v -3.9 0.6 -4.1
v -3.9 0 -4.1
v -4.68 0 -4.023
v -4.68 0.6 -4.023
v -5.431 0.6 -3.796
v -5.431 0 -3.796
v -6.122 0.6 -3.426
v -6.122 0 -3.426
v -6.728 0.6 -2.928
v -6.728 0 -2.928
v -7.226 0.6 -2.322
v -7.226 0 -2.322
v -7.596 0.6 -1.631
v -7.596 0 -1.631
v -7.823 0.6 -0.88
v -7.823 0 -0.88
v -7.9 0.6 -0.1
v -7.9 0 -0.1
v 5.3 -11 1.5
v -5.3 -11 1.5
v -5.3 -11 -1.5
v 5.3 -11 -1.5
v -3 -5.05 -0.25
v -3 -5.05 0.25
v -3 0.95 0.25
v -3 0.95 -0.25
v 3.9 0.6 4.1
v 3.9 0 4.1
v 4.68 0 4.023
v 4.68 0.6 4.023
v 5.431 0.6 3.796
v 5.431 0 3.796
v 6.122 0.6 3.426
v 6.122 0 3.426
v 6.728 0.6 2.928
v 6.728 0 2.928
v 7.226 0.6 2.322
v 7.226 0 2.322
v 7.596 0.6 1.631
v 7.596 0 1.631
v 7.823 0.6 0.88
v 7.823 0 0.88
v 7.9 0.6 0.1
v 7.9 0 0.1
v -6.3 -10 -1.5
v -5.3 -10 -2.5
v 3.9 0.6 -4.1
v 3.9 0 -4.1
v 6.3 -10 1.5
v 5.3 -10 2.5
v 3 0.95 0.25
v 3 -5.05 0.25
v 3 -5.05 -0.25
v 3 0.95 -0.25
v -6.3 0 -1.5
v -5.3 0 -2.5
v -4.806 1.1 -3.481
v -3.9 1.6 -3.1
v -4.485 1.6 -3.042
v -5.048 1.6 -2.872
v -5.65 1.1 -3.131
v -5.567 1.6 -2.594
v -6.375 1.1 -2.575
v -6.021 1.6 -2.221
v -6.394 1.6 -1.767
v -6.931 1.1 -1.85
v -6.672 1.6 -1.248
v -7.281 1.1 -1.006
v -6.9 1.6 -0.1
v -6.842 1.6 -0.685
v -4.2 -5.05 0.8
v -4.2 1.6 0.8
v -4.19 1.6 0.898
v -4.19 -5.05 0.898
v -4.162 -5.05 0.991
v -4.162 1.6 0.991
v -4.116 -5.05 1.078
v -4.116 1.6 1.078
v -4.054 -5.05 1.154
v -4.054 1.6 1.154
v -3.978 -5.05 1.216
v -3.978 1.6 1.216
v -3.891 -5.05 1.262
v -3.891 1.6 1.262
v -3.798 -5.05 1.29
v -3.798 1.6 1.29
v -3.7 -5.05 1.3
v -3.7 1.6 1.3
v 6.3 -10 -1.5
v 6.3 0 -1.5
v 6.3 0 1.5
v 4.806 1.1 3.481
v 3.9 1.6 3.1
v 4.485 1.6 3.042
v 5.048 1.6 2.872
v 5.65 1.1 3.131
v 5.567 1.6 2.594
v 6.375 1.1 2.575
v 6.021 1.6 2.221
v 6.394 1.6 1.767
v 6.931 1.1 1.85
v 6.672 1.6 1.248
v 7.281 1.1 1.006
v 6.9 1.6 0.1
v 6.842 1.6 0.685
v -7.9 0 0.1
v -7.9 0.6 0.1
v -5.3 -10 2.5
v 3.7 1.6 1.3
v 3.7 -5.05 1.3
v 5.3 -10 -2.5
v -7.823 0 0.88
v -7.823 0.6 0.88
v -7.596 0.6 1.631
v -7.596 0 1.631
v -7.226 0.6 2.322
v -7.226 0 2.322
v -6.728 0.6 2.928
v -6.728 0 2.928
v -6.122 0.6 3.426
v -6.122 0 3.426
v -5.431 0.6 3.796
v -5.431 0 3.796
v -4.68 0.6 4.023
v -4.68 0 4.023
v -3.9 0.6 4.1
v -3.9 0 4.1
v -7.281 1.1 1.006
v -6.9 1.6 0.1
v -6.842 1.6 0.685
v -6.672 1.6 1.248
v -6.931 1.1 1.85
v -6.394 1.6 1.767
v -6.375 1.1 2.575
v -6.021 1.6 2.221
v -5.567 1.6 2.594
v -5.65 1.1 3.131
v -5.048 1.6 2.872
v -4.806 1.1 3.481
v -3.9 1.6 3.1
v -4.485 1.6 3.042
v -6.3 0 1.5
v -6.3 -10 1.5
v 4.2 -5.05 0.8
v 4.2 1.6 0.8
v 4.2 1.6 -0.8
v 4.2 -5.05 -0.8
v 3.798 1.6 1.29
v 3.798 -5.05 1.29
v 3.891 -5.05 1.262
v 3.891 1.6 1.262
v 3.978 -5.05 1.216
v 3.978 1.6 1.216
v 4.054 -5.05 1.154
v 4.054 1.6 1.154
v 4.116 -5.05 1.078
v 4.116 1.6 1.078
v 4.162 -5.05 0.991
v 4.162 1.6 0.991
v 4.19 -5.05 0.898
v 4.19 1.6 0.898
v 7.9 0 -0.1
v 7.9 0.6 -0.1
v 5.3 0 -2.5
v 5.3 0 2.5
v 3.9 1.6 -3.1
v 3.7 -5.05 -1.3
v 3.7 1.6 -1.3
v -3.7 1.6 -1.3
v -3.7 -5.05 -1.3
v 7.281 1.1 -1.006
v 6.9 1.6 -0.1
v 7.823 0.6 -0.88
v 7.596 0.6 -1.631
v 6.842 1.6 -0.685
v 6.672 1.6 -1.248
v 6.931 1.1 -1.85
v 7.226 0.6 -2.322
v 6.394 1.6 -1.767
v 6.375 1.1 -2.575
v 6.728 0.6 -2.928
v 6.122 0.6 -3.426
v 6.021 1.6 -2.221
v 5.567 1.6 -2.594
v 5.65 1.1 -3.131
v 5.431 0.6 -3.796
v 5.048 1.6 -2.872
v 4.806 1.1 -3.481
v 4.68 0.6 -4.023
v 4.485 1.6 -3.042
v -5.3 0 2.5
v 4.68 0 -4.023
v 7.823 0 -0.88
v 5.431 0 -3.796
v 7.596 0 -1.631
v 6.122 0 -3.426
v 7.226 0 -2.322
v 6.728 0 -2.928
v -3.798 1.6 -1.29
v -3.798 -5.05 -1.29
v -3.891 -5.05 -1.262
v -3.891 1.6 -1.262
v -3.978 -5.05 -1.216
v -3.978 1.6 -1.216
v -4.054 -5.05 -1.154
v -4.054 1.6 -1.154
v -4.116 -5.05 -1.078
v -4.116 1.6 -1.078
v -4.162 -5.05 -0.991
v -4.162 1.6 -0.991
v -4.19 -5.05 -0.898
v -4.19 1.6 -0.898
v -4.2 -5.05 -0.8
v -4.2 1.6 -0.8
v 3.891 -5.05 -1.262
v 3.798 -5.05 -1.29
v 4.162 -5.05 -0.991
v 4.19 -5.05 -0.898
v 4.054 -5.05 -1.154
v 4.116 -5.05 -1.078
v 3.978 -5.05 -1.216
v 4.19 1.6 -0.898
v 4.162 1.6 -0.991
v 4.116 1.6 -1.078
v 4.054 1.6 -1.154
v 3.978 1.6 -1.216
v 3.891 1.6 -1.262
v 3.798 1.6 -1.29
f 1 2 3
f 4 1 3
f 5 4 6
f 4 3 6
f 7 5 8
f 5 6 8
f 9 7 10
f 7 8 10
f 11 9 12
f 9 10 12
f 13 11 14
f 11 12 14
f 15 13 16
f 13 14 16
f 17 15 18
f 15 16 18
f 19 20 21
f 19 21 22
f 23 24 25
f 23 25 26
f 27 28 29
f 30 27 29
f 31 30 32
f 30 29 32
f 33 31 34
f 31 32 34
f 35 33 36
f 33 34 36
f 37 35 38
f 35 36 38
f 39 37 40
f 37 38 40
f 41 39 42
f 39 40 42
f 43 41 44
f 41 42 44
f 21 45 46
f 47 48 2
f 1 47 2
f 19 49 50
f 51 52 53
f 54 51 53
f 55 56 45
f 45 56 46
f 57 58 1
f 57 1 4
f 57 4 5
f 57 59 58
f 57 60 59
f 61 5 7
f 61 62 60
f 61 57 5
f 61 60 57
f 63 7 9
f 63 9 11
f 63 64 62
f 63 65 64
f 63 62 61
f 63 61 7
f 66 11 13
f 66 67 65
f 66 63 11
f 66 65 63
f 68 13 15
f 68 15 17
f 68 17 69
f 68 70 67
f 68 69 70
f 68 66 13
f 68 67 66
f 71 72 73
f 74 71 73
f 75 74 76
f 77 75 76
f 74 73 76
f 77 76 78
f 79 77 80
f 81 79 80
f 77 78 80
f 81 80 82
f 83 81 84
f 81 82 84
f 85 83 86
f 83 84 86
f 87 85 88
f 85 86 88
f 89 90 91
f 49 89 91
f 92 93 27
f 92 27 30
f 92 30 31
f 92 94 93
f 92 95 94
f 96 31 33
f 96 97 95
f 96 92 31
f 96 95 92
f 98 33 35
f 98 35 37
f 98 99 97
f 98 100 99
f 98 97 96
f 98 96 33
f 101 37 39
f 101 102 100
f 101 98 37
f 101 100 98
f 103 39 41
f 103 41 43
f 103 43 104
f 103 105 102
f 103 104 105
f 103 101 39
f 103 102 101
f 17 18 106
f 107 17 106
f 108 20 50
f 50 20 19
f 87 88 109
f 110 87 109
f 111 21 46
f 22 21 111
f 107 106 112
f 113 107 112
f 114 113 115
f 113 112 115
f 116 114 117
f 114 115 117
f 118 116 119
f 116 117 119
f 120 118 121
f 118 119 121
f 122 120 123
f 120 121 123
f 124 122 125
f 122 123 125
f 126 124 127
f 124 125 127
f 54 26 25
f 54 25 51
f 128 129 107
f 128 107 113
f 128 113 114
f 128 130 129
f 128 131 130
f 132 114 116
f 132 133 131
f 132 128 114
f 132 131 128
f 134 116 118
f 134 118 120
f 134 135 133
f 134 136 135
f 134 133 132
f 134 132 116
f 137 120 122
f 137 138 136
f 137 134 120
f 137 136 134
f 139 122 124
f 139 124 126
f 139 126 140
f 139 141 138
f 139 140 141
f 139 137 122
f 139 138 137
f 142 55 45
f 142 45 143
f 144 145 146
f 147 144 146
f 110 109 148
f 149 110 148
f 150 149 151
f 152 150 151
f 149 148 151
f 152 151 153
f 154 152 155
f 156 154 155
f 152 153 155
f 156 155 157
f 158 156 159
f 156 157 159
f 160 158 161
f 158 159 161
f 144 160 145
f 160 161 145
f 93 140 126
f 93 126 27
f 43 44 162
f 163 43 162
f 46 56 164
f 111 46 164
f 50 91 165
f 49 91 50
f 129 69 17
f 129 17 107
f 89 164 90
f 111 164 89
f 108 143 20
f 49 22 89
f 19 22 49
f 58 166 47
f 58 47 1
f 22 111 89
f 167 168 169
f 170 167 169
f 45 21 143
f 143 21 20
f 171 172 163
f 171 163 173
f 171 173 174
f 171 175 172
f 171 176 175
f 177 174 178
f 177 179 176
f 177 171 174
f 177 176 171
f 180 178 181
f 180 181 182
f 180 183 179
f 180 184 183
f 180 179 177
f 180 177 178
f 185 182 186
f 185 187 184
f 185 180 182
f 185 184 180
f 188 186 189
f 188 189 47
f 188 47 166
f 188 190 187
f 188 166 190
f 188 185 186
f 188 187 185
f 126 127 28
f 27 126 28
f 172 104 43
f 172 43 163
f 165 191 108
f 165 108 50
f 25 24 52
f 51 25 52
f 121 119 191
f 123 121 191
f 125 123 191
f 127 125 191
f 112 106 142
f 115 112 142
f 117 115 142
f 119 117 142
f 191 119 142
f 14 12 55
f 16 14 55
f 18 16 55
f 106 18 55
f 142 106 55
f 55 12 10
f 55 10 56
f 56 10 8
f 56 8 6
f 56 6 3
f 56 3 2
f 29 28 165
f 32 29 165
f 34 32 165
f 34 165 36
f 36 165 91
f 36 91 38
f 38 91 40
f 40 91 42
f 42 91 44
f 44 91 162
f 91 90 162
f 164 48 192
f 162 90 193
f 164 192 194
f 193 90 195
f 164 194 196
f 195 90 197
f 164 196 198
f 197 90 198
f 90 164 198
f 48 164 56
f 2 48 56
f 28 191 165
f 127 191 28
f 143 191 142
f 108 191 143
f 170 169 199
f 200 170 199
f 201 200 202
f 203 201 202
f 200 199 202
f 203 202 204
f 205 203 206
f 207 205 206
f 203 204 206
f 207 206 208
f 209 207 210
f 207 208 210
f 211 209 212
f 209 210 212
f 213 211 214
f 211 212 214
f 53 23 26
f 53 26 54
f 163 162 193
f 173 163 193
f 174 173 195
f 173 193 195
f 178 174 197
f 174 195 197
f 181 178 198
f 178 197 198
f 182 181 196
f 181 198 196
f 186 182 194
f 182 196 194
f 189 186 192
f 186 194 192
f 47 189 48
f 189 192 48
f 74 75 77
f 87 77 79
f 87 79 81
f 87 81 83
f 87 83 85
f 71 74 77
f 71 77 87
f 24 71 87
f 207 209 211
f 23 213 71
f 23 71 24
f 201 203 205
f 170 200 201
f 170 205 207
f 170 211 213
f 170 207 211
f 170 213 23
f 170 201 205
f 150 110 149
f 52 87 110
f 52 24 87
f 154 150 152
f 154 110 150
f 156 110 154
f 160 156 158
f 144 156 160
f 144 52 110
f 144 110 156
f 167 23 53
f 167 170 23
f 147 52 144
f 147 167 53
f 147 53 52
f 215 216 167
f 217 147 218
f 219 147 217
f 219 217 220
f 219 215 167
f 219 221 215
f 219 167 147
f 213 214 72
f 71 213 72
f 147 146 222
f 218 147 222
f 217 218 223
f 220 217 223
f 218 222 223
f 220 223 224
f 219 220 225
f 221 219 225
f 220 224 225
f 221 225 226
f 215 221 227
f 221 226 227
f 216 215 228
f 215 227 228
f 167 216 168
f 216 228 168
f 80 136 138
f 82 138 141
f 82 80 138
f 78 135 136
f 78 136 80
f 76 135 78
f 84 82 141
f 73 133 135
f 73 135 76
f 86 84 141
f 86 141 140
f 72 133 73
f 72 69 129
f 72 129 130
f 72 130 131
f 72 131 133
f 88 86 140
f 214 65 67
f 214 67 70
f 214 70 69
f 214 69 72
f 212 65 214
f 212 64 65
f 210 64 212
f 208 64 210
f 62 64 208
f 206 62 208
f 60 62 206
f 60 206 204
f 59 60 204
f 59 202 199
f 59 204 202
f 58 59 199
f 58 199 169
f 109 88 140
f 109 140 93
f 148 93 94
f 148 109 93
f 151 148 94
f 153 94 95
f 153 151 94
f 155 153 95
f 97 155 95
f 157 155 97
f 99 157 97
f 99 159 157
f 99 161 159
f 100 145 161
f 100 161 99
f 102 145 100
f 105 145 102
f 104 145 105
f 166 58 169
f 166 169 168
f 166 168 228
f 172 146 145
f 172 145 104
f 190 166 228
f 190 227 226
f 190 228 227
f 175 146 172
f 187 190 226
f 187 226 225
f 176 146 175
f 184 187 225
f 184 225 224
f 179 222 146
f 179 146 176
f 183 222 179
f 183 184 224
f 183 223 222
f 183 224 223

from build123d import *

# Parameters (mm, degrees)
BOSS_EXTRUDE1_DEPTH = 1.6
CHAMFER1_SIZE       = 1
SKETCH3_W           = 12.6
SKETCH3_H           = 5
BOSS_EXTRUDE2_DEPTH = 11
CHAMFER2_SIZE       = 1
CUT_EXTRUDE1_DEPTH  = 6.65
SKETCH4_W           = 6
SKETCH4_H           = 0.5
BOSS_EXTRUDE3_DEPTH = 6


with BuildPart() as part:
    # Sketch1 → Boss-Extrude1 (new body)
    with BuildSketch(Plane(origin=(0, 0, 0), x_dir=(1, 0, 0), z_dir=(0, 1, 0))):
        with BuildLine():
            Line((-3.9, -4.1), (3.9, -4.1))
            ThreePointArc((3.9, -4.1), (6.728427125, -2.928427125), (7.9, -0.1))
            Line((7.9, -0.1), (7.9, 0.1))
            ThreePointArc((7.9, 0.1), (6.728427125, 2.928427125), (3.9, 4.1))
            Line((3.9, 4.1), (-3.9, 4.1))
            ThreePointArc((-3.9, 4.1), (-6.728427125, 2.928427125), (-7.9, 0.1))
            Line((-7.9, 0.1), (-7.9, -0.1))
            ThreePointArc((-7.9, -0.1), (-6.728427125, -2.928427125), (-3.9, -4.1))
        make_face()
    extrude(amount=BOSS_EXTRUDE1_DEPTH)

    # Chamfer1
    chamfer1_edges = [part.edges().sort_by_distance(p)[0] for p in [
        (6.728427125, 1.6, -2.928427125),
        (0, 1.6, -4.1),
        (-6.728427125, 1.6, -2.928427125),
        (-7.9, 1.6, 0),
        (-6.728427125, 1.6, 2.928427125),
        (0, 1.6, 4.1),
        (6.728427125, 1.6, 2.928427125),
        (7.9, 1.6, 0),
    ]]
    chamfer(chamfer1_edges, length=CHAMFER1_SIZE)

    # Sketch3 → Boss-Extrude2 (add)
    with BuildSketch(Plane.XZ):
        Rectangle(SKETCH3_W, SKETCH3_H)
    extrude(amount=BOSS_EXTRUDE2_DEPTH)

    # Chamfer2
    chamfer2_edges = [part.edges().sort_by_distance(p)[0] for p in [
        (-6.3, -5.5, 2.5),
        (-6.3, -5.5, -2.5),
        (6.3, -5.5, -2.5),
        (6.3, -5.5, 2.5),
        (-6.3, -11, 0),
        (0, -11, -2.5),
        (6.3, -11, 0),
        (0, -11, 2.5),
    ]]
    chamfer(chamfer2_edges, length=CHAMFER2_SIZE)

    # Sketch2 → Cut-Extrude1 (cut)
    with BuildSketch(Plane(origin=(0, 1.6, 0), x_dir=(1, 0, 0), z_dir=(0, 1, 0))):
        with BuildLine():
            Line((-3.7, -1.3), (3.7, -1.3))
            ThreePointArc((3.7, -1.3), (4.053553391, -1.153553391), (4.2, -0.8))
            Line((4.2, -0.8), (4.2, 0.8))
            ThreePointArc((4.2, 0.8), (4.053553391, 1.153553391), (3.7, 1.3))
            Line((3.7, 1.3), (-3.7, 1.3))
            ThreePointArc((-3.7, 1.3), (-4.053553391, 1.153553391), (-4.2, 0.8))
            Line((-4.2, 0.8), (-4.2, -0.8))
            ThreePointArc((-4.2, -0.8), (-4.053553391, -1.153553391), (-3.7, -1.3))
        make_face()
    extrude(amount=-CUT_EXTRUDE1_DEPTH, mode=Mode.SUBTRACT)

    # Sketch4 → Boss-Extrude3 (add)
    with BuildSketch(Plane(origin=(0, -5.05, 0), x_dir=(1, 0, 0), z_dir=(0, 1, 0))):
        Rectangle(SKETCH4_W, SKETCH4_H)
    extrude(amount=BOSS_EXTRUDE3_DEPTH)


solid = part.part
